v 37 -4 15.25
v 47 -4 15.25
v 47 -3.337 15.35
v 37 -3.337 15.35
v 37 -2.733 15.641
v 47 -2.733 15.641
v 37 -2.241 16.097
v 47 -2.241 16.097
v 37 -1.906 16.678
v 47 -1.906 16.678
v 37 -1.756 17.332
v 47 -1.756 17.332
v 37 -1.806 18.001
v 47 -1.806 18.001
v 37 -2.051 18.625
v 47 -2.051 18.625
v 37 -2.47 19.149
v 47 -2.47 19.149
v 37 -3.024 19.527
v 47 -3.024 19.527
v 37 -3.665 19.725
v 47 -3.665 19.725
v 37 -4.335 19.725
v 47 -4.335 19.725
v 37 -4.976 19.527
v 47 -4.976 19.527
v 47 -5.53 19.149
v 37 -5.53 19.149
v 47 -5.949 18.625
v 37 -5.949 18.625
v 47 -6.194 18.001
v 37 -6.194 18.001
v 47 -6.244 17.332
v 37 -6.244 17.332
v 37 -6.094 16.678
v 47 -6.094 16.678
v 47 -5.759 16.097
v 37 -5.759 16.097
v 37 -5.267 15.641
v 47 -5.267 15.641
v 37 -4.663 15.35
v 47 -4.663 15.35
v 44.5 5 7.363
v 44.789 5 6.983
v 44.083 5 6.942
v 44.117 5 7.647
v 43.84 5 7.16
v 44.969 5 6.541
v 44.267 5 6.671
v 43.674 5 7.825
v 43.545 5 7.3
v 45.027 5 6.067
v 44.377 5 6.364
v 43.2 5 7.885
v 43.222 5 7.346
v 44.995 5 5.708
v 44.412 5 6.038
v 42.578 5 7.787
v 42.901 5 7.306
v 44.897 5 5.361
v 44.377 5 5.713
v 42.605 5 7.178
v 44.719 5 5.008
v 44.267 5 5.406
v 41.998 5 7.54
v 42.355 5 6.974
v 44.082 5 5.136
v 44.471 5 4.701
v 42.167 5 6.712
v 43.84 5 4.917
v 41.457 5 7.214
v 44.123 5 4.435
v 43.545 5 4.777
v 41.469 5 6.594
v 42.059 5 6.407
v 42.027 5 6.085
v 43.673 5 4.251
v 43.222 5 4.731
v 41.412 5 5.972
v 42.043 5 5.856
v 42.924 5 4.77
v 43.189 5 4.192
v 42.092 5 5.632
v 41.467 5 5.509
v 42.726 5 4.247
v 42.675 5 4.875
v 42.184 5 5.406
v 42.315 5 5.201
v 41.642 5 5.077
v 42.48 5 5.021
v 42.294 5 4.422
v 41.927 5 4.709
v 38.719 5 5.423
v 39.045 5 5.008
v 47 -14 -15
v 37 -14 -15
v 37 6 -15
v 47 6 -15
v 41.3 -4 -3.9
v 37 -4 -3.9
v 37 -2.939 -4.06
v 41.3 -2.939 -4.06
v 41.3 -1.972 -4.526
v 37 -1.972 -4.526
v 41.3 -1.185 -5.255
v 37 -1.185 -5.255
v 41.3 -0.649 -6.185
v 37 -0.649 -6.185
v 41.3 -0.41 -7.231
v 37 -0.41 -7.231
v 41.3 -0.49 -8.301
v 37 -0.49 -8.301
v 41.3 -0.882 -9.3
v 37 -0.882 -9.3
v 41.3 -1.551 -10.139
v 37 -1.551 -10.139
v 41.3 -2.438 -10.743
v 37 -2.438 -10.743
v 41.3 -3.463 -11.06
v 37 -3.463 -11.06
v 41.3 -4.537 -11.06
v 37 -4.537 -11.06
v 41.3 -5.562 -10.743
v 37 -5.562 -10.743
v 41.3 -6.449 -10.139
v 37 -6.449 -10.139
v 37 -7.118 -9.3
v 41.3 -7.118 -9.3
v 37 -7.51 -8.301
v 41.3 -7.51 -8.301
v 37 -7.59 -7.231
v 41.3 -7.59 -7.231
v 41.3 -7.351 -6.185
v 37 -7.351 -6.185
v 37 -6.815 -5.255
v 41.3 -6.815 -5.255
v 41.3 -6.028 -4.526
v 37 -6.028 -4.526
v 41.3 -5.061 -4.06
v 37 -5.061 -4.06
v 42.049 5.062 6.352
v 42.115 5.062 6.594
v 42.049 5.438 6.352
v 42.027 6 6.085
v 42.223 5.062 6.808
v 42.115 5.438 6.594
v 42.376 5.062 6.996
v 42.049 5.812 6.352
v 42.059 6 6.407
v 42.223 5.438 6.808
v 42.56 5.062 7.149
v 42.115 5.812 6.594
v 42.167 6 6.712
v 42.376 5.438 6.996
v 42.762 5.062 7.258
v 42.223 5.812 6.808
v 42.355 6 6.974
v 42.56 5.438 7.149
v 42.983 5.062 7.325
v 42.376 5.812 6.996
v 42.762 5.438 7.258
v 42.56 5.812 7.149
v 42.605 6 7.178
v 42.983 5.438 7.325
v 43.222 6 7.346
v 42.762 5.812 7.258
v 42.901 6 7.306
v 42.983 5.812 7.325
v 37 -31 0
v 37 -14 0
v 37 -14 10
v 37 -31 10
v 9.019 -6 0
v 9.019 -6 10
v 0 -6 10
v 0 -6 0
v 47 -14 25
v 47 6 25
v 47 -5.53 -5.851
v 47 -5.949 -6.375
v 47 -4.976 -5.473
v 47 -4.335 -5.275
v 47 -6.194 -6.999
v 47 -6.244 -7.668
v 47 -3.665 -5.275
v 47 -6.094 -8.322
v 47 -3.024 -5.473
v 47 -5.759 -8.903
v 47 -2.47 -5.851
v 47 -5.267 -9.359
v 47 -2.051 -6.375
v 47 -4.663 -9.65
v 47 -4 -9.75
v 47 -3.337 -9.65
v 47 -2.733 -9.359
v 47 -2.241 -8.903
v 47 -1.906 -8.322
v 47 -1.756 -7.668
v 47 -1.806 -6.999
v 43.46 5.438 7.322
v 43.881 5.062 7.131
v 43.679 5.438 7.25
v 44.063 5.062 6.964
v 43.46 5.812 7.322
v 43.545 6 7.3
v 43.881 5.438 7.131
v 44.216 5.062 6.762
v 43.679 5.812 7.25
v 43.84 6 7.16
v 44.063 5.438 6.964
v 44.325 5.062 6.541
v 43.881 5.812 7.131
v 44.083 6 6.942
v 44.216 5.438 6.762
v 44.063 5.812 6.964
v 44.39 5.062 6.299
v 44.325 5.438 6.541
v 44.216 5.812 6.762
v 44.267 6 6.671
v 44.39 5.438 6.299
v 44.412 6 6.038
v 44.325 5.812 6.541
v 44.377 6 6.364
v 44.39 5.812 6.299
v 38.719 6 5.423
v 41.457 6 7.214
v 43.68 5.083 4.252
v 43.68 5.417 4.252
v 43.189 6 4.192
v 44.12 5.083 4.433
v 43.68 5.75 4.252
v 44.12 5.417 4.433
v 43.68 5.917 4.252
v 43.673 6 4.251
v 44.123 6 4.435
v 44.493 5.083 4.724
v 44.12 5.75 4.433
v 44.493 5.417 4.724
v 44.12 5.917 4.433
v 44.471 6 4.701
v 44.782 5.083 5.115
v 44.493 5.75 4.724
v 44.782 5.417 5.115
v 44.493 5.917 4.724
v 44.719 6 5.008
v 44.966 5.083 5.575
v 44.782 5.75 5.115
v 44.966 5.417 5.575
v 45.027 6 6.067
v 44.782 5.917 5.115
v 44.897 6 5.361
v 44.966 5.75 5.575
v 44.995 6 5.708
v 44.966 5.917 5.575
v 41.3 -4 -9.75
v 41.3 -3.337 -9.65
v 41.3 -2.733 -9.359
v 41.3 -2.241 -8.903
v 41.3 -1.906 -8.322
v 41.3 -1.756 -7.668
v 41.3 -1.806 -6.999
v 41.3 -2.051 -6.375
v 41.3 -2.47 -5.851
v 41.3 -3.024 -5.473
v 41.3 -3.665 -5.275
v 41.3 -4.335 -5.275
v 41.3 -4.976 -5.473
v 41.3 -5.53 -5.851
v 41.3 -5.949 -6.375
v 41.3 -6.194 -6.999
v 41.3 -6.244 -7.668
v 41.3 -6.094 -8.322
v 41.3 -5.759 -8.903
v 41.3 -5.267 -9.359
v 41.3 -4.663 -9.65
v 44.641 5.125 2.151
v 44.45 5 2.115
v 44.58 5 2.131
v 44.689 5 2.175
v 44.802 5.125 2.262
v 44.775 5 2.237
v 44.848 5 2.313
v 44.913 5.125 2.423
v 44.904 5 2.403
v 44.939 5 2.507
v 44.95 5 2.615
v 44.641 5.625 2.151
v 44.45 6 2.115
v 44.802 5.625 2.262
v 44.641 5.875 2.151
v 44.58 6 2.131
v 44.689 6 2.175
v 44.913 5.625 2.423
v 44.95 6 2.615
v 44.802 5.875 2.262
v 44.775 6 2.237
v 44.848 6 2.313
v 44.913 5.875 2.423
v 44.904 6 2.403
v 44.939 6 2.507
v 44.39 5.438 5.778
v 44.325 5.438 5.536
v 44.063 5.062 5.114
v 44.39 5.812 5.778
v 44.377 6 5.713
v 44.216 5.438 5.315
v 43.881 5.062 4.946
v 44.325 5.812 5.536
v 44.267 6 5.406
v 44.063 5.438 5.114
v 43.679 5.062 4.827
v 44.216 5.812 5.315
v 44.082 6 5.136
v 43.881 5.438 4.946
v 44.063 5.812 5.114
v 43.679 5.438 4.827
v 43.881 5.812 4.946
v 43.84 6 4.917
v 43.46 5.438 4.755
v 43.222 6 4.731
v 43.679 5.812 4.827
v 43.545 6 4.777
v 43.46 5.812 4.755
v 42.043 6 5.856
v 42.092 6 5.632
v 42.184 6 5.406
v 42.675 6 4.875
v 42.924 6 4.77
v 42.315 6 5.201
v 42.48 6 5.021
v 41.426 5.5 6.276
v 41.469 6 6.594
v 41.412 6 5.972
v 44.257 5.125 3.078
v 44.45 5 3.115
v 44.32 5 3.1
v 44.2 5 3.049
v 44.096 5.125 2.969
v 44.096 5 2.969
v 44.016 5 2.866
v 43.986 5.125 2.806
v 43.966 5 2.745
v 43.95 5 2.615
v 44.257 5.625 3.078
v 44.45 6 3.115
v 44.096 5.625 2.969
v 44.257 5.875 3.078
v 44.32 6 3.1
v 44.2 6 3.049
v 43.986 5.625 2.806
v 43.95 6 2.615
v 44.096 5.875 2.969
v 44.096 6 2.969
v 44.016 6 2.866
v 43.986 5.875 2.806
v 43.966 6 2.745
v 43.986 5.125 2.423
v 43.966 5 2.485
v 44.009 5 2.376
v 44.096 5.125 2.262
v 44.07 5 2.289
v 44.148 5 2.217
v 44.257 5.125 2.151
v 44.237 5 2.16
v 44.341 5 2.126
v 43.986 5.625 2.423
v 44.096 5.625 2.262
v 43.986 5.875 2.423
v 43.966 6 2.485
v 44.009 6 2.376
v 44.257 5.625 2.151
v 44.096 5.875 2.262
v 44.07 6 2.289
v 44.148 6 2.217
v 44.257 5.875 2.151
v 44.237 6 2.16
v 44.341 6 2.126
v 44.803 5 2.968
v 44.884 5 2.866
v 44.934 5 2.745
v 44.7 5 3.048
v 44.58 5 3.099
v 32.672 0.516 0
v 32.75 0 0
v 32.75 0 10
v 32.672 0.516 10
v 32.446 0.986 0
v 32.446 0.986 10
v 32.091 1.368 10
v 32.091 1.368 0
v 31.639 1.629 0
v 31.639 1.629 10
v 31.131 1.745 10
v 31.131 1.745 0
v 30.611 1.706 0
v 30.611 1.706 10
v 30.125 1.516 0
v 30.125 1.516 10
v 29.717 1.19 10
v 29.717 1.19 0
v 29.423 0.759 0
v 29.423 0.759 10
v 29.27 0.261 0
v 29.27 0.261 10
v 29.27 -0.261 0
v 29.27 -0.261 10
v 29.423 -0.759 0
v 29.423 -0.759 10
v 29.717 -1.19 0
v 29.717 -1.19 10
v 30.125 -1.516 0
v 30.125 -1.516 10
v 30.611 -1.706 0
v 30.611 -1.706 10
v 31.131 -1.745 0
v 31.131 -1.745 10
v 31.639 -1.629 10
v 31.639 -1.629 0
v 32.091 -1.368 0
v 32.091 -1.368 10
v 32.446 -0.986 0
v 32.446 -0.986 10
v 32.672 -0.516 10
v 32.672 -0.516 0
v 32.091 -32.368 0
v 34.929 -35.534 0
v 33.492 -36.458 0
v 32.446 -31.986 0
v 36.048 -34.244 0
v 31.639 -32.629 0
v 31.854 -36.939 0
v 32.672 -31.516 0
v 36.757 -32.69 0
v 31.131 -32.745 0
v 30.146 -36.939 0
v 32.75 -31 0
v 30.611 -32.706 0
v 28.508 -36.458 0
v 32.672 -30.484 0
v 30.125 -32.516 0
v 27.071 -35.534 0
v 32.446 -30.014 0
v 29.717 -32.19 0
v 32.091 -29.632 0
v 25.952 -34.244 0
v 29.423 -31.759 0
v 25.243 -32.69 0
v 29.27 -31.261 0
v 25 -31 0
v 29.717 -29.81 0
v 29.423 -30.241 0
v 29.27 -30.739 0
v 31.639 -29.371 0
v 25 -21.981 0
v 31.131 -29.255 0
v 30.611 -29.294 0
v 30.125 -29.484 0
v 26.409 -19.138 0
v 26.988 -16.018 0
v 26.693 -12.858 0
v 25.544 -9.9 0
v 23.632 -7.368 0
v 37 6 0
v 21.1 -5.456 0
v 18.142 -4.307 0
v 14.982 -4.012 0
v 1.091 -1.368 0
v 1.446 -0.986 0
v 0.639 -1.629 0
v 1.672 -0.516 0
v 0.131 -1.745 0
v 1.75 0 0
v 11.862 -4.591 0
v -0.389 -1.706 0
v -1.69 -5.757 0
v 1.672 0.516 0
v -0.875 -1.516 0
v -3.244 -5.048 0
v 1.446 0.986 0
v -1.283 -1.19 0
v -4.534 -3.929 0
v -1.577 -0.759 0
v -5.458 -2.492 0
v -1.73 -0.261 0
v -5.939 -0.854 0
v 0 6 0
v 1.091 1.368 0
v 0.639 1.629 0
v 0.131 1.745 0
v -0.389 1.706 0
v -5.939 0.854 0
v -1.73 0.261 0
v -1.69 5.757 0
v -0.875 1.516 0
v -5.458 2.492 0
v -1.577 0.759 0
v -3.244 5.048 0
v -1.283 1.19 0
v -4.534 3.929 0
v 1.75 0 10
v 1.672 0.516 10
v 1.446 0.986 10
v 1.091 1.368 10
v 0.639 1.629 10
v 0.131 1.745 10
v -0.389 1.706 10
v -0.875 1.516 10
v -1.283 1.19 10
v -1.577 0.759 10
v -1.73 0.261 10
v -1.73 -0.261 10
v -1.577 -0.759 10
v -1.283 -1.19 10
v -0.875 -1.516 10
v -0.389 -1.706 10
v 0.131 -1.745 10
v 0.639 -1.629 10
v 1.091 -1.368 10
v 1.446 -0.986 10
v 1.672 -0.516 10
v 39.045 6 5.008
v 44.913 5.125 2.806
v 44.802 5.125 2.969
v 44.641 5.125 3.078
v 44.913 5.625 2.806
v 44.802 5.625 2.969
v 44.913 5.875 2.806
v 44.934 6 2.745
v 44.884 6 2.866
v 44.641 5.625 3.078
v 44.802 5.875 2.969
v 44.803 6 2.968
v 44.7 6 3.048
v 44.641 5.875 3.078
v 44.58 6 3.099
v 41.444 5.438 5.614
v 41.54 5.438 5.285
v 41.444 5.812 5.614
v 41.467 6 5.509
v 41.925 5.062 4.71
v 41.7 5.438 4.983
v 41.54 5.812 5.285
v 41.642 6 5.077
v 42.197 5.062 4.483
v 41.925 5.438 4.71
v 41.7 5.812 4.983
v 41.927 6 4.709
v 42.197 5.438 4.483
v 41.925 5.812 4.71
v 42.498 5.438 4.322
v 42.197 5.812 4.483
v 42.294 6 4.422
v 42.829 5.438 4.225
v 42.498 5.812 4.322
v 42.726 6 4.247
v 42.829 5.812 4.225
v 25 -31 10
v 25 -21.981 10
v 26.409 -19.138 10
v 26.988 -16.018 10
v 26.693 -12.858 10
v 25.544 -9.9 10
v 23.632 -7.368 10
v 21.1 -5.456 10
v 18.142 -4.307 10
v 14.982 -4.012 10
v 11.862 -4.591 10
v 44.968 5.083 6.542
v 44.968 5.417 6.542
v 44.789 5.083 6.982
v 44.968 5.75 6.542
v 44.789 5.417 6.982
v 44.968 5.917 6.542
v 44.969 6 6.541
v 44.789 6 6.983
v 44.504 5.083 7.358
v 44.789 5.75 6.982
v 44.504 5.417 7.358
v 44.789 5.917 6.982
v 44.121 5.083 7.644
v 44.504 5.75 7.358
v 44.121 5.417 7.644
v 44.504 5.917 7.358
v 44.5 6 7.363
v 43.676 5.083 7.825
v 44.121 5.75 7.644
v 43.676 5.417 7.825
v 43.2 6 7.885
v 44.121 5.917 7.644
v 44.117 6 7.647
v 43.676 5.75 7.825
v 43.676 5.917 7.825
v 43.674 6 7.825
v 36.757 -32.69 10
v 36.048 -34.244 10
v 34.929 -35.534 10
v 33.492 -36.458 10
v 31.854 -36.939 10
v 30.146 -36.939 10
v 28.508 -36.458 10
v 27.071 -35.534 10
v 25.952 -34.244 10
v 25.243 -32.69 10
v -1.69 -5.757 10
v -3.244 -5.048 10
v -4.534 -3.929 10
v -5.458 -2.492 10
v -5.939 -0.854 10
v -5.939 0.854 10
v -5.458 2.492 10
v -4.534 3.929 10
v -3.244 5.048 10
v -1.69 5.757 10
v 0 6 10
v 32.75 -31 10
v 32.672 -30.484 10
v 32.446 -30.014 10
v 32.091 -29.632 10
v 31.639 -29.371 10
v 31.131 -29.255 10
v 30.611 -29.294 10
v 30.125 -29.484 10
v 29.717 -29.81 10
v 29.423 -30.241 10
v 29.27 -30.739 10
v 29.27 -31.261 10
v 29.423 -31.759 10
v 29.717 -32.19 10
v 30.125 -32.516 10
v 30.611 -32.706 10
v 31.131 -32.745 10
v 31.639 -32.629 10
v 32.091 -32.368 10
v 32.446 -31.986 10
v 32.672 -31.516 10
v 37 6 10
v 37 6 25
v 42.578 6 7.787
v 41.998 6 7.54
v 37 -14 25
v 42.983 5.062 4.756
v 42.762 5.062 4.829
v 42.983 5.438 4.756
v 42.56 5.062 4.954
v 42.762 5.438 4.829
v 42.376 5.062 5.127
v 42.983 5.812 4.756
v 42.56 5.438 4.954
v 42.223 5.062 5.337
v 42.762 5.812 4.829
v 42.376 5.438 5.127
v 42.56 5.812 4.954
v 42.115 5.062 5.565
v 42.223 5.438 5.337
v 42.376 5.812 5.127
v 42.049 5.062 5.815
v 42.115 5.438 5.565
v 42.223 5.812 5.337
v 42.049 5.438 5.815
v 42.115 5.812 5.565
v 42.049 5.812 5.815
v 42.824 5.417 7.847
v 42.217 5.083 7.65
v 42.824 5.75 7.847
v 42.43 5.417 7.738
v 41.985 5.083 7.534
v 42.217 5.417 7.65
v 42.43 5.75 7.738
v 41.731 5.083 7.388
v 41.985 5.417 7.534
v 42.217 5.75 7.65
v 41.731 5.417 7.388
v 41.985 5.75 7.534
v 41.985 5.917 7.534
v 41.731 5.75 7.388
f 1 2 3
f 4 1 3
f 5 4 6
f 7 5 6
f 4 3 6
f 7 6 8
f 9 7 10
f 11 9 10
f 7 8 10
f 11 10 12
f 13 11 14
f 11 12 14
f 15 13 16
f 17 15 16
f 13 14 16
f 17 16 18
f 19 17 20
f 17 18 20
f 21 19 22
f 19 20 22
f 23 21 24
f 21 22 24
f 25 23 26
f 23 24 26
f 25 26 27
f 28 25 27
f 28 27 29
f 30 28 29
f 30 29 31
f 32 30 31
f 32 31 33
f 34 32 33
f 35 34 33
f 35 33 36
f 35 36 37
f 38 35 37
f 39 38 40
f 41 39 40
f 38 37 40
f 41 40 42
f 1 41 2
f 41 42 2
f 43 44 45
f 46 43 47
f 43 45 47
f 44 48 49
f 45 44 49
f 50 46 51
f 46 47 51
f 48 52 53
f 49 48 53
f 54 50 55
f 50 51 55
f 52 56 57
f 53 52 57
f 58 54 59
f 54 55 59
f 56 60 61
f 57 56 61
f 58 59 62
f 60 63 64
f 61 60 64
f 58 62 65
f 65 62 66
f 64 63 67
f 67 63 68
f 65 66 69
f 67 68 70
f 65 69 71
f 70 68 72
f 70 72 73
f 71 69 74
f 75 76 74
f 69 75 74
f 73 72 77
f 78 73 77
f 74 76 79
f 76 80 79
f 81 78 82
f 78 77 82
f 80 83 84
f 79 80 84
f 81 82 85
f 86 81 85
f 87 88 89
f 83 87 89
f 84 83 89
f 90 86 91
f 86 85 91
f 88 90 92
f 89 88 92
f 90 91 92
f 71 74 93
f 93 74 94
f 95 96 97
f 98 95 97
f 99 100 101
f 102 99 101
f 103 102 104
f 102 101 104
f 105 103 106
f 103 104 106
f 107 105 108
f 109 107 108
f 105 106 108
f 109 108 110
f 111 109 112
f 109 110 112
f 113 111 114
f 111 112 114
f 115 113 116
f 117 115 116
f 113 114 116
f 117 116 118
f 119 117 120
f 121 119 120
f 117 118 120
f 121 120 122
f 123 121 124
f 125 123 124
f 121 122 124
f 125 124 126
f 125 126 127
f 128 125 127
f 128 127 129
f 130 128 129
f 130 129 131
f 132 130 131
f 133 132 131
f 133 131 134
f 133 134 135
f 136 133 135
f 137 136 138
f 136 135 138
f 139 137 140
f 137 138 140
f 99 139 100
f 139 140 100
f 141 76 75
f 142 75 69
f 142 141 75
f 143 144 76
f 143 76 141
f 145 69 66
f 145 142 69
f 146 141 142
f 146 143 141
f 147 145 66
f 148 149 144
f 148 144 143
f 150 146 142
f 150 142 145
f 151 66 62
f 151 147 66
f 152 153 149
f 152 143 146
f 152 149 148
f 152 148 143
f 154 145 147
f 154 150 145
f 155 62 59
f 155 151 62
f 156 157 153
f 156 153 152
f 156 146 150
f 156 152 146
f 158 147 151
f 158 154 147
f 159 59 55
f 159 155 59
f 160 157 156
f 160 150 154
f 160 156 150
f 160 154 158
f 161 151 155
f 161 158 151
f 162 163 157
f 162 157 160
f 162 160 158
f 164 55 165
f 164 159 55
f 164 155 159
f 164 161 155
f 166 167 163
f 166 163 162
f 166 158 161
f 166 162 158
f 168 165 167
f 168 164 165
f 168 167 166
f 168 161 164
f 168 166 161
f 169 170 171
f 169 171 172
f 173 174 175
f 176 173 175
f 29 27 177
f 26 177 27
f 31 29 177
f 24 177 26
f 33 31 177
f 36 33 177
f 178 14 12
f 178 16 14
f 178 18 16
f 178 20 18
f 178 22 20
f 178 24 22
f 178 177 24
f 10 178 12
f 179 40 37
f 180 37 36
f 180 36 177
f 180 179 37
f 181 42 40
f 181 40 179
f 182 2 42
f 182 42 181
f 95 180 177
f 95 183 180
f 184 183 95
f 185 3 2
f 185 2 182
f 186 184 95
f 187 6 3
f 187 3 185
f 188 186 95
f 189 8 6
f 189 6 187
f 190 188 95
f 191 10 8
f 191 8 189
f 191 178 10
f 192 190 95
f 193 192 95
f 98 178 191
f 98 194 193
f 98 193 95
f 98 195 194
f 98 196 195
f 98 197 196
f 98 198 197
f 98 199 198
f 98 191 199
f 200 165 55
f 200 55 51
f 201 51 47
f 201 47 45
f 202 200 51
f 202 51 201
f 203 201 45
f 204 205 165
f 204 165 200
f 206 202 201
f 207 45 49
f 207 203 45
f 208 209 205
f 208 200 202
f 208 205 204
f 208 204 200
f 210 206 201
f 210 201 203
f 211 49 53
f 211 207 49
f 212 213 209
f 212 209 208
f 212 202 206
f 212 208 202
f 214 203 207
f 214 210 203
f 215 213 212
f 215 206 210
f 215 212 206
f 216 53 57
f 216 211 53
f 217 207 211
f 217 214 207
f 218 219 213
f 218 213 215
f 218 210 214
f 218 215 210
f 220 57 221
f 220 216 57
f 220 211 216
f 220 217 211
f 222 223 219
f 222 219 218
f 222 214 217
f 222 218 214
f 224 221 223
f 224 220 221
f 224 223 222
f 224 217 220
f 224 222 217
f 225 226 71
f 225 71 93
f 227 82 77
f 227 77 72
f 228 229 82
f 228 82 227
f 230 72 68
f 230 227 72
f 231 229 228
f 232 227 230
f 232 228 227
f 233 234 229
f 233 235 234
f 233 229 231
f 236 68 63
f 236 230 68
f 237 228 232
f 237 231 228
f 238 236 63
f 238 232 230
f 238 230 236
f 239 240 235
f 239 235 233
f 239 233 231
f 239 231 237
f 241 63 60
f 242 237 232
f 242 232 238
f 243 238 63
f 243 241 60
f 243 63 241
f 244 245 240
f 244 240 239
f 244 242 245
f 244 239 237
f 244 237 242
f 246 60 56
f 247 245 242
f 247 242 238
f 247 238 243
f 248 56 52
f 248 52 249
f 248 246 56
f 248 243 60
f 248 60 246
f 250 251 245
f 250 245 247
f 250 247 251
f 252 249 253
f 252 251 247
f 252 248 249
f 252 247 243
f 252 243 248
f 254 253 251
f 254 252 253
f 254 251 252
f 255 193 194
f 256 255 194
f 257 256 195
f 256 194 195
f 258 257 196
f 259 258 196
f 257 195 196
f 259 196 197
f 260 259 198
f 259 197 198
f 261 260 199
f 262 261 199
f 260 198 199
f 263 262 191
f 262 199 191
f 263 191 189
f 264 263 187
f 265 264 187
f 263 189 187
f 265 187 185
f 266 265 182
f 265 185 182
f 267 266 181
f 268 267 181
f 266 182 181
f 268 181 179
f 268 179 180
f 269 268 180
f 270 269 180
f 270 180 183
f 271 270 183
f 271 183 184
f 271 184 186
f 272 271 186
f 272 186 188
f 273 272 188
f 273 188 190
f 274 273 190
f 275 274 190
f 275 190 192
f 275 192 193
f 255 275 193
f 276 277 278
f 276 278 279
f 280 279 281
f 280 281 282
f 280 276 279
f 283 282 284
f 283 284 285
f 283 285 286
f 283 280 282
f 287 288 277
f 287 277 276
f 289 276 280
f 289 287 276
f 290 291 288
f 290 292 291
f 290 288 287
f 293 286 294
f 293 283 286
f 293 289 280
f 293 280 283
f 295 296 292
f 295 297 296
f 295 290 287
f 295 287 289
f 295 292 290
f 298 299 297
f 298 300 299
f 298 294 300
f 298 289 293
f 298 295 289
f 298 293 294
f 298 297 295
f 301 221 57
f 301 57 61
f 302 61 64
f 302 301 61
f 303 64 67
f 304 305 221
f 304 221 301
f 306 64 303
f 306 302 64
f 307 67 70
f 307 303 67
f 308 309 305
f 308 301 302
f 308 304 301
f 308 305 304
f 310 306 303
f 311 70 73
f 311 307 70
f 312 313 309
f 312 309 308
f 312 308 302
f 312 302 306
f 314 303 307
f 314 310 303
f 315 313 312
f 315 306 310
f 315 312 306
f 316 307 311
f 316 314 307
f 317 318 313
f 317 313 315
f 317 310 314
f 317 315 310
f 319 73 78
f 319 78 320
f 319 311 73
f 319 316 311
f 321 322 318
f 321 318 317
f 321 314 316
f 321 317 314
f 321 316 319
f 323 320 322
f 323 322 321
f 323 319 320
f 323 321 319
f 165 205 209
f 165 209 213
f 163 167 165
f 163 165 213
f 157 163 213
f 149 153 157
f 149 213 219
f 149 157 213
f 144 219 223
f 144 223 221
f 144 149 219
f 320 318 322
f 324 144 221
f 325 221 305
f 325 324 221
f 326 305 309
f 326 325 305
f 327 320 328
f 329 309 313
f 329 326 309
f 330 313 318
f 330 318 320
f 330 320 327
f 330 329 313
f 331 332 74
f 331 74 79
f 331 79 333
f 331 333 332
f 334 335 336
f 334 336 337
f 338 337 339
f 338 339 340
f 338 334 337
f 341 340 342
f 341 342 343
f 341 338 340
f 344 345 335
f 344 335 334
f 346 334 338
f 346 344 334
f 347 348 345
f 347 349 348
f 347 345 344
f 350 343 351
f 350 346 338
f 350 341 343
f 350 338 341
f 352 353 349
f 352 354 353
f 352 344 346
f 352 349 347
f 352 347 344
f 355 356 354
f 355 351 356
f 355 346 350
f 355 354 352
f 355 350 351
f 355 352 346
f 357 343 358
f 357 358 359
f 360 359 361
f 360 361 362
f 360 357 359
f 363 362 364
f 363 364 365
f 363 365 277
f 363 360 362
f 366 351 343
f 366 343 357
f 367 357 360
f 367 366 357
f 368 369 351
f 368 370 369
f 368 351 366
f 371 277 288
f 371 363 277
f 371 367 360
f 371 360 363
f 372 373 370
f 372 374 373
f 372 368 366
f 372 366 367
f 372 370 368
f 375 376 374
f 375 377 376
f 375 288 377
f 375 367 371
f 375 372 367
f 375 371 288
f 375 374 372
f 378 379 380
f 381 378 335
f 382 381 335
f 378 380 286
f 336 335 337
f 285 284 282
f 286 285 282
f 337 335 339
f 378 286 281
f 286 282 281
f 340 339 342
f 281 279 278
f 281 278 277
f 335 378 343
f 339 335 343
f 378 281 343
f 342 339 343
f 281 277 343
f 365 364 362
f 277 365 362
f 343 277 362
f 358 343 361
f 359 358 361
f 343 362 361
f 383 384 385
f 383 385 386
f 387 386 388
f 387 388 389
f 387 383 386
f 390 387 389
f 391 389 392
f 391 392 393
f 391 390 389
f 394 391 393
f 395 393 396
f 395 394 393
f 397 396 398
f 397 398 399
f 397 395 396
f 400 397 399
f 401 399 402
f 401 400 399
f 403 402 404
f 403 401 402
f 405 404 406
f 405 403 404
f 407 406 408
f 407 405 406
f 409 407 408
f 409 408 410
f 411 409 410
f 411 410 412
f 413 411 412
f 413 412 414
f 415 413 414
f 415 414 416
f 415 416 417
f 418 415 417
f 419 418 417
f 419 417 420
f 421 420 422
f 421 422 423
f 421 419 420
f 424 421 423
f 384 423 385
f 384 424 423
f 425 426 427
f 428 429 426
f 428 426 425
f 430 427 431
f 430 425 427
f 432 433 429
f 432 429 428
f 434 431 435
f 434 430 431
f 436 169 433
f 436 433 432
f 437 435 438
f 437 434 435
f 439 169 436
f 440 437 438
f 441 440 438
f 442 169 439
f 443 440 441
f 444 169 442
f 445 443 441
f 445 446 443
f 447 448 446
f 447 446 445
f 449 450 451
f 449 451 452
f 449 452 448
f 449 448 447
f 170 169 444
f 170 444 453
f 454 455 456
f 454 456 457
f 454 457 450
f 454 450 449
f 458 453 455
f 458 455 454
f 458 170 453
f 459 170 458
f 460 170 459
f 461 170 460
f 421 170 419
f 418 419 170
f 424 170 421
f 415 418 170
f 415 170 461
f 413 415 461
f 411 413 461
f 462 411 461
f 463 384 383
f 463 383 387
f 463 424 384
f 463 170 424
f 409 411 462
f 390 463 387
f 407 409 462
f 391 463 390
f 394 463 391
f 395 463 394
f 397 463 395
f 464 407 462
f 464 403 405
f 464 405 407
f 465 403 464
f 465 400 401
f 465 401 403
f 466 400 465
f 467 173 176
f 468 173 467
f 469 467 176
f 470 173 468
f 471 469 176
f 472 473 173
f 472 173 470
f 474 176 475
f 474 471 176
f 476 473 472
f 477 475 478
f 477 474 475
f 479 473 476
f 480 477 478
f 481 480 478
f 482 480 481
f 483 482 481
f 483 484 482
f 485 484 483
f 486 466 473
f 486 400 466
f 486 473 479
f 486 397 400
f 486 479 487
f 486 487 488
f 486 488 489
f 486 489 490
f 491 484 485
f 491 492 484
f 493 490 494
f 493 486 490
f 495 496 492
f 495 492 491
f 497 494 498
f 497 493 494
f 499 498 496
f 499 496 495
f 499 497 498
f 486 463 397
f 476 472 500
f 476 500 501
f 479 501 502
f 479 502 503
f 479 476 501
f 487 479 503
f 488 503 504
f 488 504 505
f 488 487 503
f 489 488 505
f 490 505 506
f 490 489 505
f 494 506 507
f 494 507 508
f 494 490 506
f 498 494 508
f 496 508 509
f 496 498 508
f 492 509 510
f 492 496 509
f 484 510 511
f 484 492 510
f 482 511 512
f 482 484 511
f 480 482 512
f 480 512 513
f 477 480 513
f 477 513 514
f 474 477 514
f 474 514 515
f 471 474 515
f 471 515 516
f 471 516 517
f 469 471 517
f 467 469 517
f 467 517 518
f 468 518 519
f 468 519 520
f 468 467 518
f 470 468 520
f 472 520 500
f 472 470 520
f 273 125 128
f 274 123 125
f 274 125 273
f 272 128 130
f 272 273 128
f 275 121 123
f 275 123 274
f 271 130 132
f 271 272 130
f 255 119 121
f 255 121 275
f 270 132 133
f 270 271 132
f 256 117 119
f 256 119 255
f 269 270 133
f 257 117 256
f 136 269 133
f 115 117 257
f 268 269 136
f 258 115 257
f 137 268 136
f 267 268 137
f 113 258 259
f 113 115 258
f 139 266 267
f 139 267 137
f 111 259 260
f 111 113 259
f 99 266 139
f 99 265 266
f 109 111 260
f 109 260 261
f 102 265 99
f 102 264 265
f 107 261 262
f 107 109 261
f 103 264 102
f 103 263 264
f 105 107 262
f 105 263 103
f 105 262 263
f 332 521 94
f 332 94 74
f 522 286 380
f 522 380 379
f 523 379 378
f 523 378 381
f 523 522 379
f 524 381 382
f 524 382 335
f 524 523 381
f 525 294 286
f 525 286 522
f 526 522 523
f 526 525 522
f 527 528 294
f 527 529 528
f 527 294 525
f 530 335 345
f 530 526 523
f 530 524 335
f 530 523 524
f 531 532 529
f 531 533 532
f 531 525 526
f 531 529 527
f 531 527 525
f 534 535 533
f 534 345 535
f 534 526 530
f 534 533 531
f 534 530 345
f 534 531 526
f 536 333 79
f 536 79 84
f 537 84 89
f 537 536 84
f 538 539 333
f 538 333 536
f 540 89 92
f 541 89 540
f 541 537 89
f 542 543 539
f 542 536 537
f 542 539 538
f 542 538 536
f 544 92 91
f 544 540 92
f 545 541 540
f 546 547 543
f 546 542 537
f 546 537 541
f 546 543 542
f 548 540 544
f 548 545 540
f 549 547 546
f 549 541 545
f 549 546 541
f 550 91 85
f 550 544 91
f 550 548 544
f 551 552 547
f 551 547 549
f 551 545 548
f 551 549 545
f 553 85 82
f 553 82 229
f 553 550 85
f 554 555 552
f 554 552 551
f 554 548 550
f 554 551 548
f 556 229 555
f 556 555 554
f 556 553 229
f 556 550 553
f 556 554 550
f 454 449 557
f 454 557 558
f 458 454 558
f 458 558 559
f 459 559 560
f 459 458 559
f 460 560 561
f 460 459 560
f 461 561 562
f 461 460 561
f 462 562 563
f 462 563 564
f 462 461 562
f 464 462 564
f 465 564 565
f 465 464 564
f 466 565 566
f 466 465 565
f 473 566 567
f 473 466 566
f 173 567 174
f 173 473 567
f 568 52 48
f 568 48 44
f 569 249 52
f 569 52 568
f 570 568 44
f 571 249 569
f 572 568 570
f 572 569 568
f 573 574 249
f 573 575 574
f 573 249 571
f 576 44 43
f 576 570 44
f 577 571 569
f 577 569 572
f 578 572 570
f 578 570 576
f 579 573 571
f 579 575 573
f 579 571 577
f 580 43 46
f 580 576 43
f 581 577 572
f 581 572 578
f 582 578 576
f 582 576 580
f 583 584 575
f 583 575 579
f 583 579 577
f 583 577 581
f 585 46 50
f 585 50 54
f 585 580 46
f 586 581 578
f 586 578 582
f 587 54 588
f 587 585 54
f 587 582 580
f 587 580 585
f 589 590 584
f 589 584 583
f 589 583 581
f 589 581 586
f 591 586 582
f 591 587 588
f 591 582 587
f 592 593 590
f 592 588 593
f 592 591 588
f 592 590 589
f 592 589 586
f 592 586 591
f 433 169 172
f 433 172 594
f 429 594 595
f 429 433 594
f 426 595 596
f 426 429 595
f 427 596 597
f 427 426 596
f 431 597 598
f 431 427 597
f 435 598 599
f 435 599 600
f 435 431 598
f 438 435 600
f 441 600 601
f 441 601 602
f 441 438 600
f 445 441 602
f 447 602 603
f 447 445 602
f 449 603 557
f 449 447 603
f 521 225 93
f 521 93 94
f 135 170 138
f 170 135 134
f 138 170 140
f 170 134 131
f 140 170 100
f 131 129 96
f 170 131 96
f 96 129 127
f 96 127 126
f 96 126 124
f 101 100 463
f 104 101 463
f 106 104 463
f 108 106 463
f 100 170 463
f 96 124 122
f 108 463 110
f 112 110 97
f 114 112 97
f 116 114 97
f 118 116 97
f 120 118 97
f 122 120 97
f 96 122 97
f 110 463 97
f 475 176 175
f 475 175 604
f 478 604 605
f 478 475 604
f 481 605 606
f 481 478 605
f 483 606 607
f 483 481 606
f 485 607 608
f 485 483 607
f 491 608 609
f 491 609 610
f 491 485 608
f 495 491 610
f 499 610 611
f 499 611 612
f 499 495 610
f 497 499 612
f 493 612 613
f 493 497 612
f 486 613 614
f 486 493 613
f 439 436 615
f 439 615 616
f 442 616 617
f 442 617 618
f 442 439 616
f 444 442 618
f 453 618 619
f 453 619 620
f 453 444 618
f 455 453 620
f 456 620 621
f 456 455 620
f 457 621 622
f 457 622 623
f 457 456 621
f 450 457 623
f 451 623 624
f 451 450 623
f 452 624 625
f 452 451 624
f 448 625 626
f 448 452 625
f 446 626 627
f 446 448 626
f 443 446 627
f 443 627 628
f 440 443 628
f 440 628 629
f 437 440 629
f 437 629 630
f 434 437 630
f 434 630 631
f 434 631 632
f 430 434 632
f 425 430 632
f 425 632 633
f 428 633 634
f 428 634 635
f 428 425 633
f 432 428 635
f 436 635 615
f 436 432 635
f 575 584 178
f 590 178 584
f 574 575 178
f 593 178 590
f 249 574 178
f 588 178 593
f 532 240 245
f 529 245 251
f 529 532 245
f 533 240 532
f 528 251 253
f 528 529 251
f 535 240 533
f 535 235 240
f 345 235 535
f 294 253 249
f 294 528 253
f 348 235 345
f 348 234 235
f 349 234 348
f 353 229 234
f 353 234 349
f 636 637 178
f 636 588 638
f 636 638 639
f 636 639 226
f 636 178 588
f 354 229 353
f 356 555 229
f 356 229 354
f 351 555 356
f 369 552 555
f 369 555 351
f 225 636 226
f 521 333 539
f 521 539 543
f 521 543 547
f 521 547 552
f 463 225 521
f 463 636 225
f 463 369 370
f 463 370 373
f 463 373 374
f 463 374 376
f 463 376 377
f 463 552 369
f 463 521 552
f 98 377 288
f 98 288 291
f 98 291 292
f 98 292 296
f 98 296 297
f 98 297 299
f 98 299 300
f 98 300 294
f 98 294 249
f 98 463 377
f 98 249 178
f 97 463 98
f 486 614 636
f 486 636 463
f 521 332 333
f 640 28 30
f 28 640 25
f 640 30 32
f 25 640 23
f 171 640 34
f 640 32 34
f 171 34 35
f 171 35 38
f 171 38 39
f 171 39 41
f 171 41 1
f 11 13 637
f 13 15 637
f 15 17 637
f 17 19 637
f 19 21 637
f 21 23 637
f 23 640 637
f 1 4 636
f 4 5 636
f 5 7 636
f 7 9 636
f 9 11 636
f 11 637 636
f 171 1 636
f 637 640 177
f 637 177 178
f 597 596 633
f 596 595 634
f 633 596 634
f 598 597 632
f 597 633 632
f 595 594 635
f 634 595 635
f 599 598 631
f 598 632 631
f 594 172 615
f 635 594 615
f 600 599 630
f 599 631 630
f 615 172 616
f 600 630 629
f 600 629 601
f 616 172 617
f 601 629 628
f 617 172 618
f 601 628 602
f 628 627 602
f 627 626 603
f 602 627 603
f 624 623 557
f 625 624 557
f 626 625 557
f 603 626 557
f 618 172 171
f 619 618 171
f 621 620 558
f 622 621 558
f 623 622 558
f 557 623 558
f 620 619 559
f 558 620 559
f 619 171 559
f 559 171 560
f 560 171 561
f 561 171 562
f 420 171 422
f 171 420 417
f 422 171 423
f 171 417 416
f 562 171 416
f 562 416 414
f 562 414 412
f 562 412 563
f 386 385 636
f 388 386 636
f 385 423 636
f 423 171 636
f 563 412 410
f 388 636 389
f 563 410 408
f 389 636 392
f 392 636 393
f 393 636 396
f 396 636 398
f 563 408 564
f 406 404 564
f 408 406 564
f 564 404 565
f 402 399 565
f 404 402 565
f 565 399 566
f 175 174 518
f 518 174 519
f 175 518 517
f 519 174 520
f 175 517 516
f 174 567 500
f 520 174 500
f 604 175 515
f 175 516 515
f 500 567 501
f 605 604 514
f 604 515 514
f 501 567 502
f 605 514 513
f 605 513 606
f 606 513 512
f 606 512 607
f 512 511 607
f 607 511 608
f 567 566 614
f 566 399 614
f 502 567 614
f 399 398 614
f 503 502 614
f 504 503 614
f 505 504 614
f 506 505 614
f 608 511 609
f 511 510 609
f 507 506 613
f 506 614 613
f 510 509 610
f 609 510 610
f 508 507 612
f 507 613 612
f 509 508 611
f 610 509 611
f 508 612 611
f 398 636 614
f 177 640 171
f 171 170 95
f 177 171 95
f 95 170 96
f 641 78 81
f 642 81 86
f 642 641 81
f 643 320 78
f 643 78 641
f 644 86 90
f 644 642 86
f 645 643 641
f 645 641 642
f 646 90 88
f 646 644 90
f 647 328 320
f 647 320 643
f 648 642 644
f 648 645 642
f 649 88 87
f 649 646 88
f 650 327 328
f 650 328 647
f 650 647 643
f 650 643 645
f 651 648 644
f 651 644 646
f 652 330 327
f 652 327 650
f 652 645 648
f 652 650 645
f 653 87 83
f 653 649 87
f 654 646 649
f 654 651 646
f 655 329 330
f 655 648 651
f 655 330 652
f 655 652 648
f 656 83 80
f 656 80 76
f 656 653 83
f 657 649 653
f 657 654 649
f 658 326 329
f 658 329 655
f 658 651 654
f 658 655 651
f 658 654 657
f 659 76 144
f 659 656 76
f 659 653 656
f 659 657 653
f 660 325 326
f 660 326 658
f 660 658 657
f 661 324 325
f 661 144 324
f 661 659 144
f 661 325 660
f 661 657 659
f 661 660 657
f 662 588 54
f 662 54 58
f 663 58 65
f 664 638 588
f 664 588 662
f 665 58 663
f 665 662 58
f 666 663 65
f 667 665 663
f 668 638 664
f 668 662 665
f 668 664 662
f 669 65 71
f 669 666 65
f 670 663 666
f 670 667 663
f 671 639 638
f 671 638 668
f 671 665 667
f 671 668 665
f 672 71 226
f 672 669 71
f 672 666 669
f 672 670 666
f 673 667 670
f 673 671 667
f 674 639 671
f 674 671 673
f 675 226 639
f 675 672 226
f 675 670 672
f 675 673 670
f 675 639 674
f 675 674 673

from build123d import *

# Parameters (mm, degrees)
CROQUIS1_R              = 1.75
SALIENTE_EXTRUIR1_DEPTH = 10
CROQUIS3_W              = 40
CROQUIS3_H              = 20
SALIENTE_EXTRUIR2_DEPTH = 10
CROQUIS4_R              = 2.25
CORTAR_EXTRUIR2_DEPTH   = 10
CORTAR_EXTRUIR3_DEPTH   = 1
CROQUIS6_R              = 3.6
CORTAR_EXTRUIR4_DEPTH   = 4.3


with BuildPart() as part:
    # Croquis1 → Saliente-Extruir1 (new body)
    with BuildSketch(Plane.XY):
        with BuildLine():
            Line((0, 6), (31, 6))
            Line((31, 6), (37, 6))
            Line((37, 6), (37, 0))
            Line((37, 0), (37, -31))
            ThreePointArc((37, -31), (31, -37), (25, -31))
            Line((25, -31), (25, -21.980740698))
            ThreePointArc((25, -21.980740698), (23.631727984, -7.368272016), (9.019259302, -6))
            Line((9.019259302, -6), (0, -6))
            ThreePointArc((0, -6), (-6, 0), (0, 6))
        make_face()
        Circle(CROQUIS1_R, mode=Mode.SUBTRACT)
        with Locations((31, 0)):
            Circle(CROQUIS1_R, mode=Mode.SUBTRACT)
        with Locations((31, -31)):
            Circle(CROQUIS1_R, mode=Mode.SUBTRACT)
    extrude(amount=SALIENTE_EXTRUIR1_DEPTH)

    # Croquis3 → Saliente-Extruir2 (add)
    with BuildSketch(Plane(origin=(37, 0, 0), x_dir=(0, 0, -1), z_dir=(1, 0, 0))):
        with Locations((-5, -4)):
            Rectangle(CROQUIS3_W, CROQUIS3_H)
    extrude(amount=SALIENTE_EXTRUIR2_DEPTH)

    # Croquis4 → Cortar-Extruir2 (cut)
    with BuildSketch(Plane(origin=(47, 0, 0), x_dir=(0, 0, -1), z_dir=(1, 0, 0))):
        with Locations((-17.5, -4)):
            Circle(CROQUIS4_R)
        with Locations((7.5, -4)):
            Circle(CROQUIS4_R)
    extrude(amount=-CORTAR_EXTRUIR2_DEPTH, mode=Mode.SUBTRACT)

    # Croquis5 → Cortar-Extruir3 (cut)
    # profile 1 of 2: a face of its own
    with BuildSketch(Plane(origin=(0, 6, 0), x_dir=(1, 0, 0), z_dir=(0, 1, 0))):
        with BuildLine():
            Line((38.719450651, -5.423076923), (39.045171805, -5.008413462))
            Line((39.045171805, -5.008413462), (41.469450651, -6.59375))
            add(Edge.make_bspline(
                [(41.469450651, -6.59375), (41.45262689, -6.488200954), (41.419810241, -6.282315605), (41.414396621, -6.073916922), (41.411758343, -5.972355769)],
                knots=[0, 0, 0, 0, 1.025318673, 2, 2, 2, 2], degree=3))
            add(Edge.make_bspline(
                [(41.411758343, -5.972355769), (41.413397392, -5.911374347), (41.41662381, -5.791334232), (41.441453269, -5.615094001), (41.48058203, -5.445741533), (41.537620193, -5.283978793), (41.610481332, -5.12922502), (41.69780526, -4.98059268), (41.804100137, -4.84087365), (41.922842279, -4.708276629), (42.054348853, -4.587868709), (42.193923862, -4.481348491), (42.341556266, -4.391383269), (42.497212867, -4.319707477), (42.659675206, -4.262425826), (42.829576898, -4.221648263), (43.0072047, -4.197270821), (43.128028028, -4.193979555), (43.189402574, -4.192307692)],
                knots=[0, 0, 0, 0, 1.043709831, 2.054511743, 3.041122595, 4.01515914, 4.98481438, 5.965901842, 6.960491961, 7.985277438, 9.0096037, 10.00832444, 10.987059228, 11.962929573, 12.936966118, 13.931840027, 14.949438142, 16, 16, 16, 16], degree=3))
            add(Edge.make_bspline(
                [(43.189402574, -4.192307692), (43.273370923, -4.194741372), (43.438600762, -4.199530277), (43.679201656, -4.247450052), (43.908280527, -4.321356873), (44.121873475, -4.428685672), (44.321459866, -4.559473328), (44.497723912, -4.720926587), (44.654923346, -4.905035031), (44.786320549, -5.113320498), (44.893643904, -5.337445219), (44.970726157, -5.572907398), (45.018183801, -5.817410653), (45.024133369, -5.983361467), (45.027142959, -6.067307692)],
                knots=[0, 0, 0, 0, 1.031403119, 2.029557249, 3.004870281, 3.983165322, 4.960181699, 5.929903783, 6.912123683, 7.928973898, 8.949315281, 9.960468141, 10.968302741, 12, 12, 12, 12], degree=3))
            add(Edge.make_bspline(
                [(45.027142959, -6.067307692), (45.024530622, -6.148048292), (45.019356041, -6.307981282), (44.973019832, -6.5431878), (44.898450918, -6.769592811), (44.79356478, -6.984290092), (44.66331814, -7.183504791), (44.507611369, -7.363156395), (44.32622815, -7.5184301), (44.123136349, -7.648813278), (43.905204402, -7.75266345), (43.677571617, -7.829814545), (43.441193643, -7.875117968), (43.280937295, -7.881434097), (43.200219882, -7.884615385)],
                knots=[0, 0, 0, 0, 1.012172929, 2.004937354, 2.995255351, 3.995689452, 4.993936421, 5.973737378, 6.968231049, 7.979117505, 8.993136101, 9.989812463, 10.987515067, 12, 12, 12, 12], degree=3))
            add(Edge.make_bspline(
                [(43.200219882, -7.884615385), (43.138429168, -7.88259005), (43.012264336, -7.878454705), (42.821183145, -7.849580321), (42.625667005, -7.80318353), (42.459802673, -7.751223108), (42.323925778, -7.696322062), (42.214376937, -7.650631994), (42.101643669, -7.593762287), (41.981860293, -7.533122205), (41.858113837, -7.463253287), (41.728336117, -7.387283602), (41.594591099, -7.303112772), (41.503829621, -7.244106778), (41.45743142, -7.213942308)],
                knots=[0, 0, 0, 0, 1.173818275, 2.396712641, 3.66331629, 4.989737886, 5.693666774, 6.447286557, 7.243889047, 8.091586357, 8.998013824, 9.943181721, 10.948533338, 12, 12, 12, 12], degree=3))
            Line((41.45743142, -7.213942308), (38.719450651, -5.423076923))
        make_face()
        with BuildLine():
            add(Edge.make_bspline(
                [(42.027142959, -6.085336538), (42.028463871, -6.131047697), (42.031043996, -6.220334868), (42.046353115, -6.351256722), (42.074217455, -6.47556773), (42.112853793, -6.593303975), (42.160487874, -6.705191769), (42.221606583, -6.809013804), (42.29279593, -6.906906504), (42.373927128, -6.997305799), (42.462694986, -7.079287189), (42.557788622, -7.149882157), (42.656897901, -7.210778026), (42.760855723, -7.260289629), (42.869621095, -7.298844068), (42.982694109, -7.326732492), (43.100832915, -7.34225321), (43.180945778, -7.344835321), (43.221854497, -7.346153846)],
                knots=[0, 0, 0, 0, 1.129656352, 2.206547016, 3.251334079, 4.271920891, 5.265058649, 6.249872215, 7.241923875, 8.251504132, 9.246416584, 10.222533834, 11.173322129, 12.116503788, 13.062124155, 14.020151864, 14.989013135, 16, 16, 16, 16], degree=3))
            add(Edge.make_bspline(
                [(43.221854497, -7.346153846), (43.262390236, -7.345042059), (43.342270883, -7.342851147), (43.459527516, -7.324197734), (43.572108371, -7.294382199), (43.679590351, -7.251311648), (43.784036826, -7.19897235), (43.882187361, -7.131790832), (43.97722126, -7.054685968), (44.064722932, -6.964658995), (44.145955918, -6.8673042), (44.217253031, -6.763510182), (44.277542135, -6.654839733), (44.327498317, -6.541605832), (44.364273193, -6.422408765), (44.39242636, -6.29918399), (44.407818081, -6.170256123), (44.410427684, -6.082969666), (44.411758343, -6.038461538)],
                knots=[0, 0, 0, 0, 0.989367052, 1.949669134, 2.891858276, 3.827522767, 4.772653562, 5.738670152, 6.725809442, 7.756636004, 8.798867547, 9.819240912, 10.826537776, 11.829883227, 12.835515726, 13.868058748, 14.912904531, 16, 16, 16, 16], degree=3))
            add(Edge.make_bspline(
                [(44.411758343, -6.038461538), (44.41042758, -5.993953484), (44.407817774, -5.90666717), (44.392427526, -5.777738265), (44.364268919, -5.654517323), (44.327513802, -5.535306334), (44.277484342, -5.422124068), (44.217630322, -5.313548608), (44.145518764, -5.210736256), (44.064862408, -5.113318104), (43.976721258, -5.02366527), (43.883043664, -4.944746981), (43.783251472, -4.879664359), (43.680001032, -4.825249844), (43.572044173, -4.782656193), (43.459545037, -4.752693871), (43.342266312, -4.73408014), (43.262388698, -4.731883781), (43.221854497, -4.730769231)],
                knots=[0, 0, 0, 0, 1.087281468, 2.132306021, 3.165025708, 4.170830268, 5.174347389, 6.181816599, 7.194310624, 8.23672049, 9.267723423, 10.261267456, 11.222032883, 12.171822355, 13.107646935, 14.049997283, 15.01046367, 16, 16, 16, 16], degree=3))
            add(Edge.make_bspline(
                [(43.221854497, -4.730769231), (43.180892409, -4.73171259), (43.100497153, -4.733564098), (42.982746954, -4.754505725), (42.869046586, -4.783549789), (42.760110728, -4.827406434), (42.656368933, -4.884383287), (42.557298409, -4.953783726), (42.462134709, -5.034066908), (42.373753422, -5.126810316), (42.292883888, -5.227746884), (42.22170449, -5.335154265), (42.160945465, -5.447073949), (42.113001784, -5.565082488), (42.074377809, -5.687592088), (42.046452462, -5.815448694), (42.031083903, -5.948743241), (42.028473339, -6.039225506), (42.027142959, -6.085336538)],
                knots=[0, 0, 0, 0, 0.978259475, 1.920005202, 2.851759169, 3.7803069, 4.719124913, 5.675758531, 6.668034766, 7.691045932, 8.733780038, 9.756656648, 10.768121246, 11.773215211, 12.79725739, 13.836288844, 14.897342417, 16, 16, 16, 16], degree=3))
        make_face(mode=Mode.SUBTRACT)
    # profile 2 of 2: a face of its own
    with BuildSketch(Plane(origin=(0, 6, 0), x_dir=(1, 0, 0), z_dir=(0, 1, 0))):
        with BuildLine():
            add(Edge.make_bspline(
                [(43.950219882, -2.615384615), (43.95220531, -2.581972823), (43.956097511, -2.51647291), (43.98280038, -2.421777262), (44.030215227, -2.336072131), (44.093408561, -2.25973114), (44.170029698, -2.196805752), (44.255051256, -2.147701148), (44.3505397, -2.121230888), (44.416419143, -2.117367039), (44.450219882, -2.115384615)],
                knots=[0, 0, 0, 0, 1.020151414, 1.999887582, 2.974338812, 3.990962822, 5.007586832, 5.987933904, 6.967670073, 8, 8, 8, 8], degree=3))
            add(Edge.make_bspline(
                [(44.450219882, -2.115384615), (44.48321411, -2.117427904), (44.548278244, -2.121457239), (44.642964488, -2.147713091), (44.728083557, -2.196746141), (44.804525099, -2.260131503), (44.869244769, -2.335615588), (44.916031001, -2.422045399), (44.944737682, -2.516233448), (44.948370129, -2.581929945), (44.950219882, -2.615384615)],
                knots=[0, 0, 0, 0, 1.009624703, 1.990965087, 2.972917375, 3.991206001, 5.017354006, 5.993400798, 6.978178195, 8, 8, 8, 8], degree=3))
            add(Edge.make_bspline(
                [(44.950219882, -2.615384615), (44.948437276, -2.648863379), (44.944957162, -2.714222696), (44.915444253, -2.80805959), (44.869691223, -2.895016193), (44.804407281, -2.970480663), (44.728478959, -3.034379676), (44.642378281, -3.081237346), (44.548549602, -3.109769691), (44.483267561, -3.113497493), (44.450219882, -3.115384615)],
                knots=[0, 0, 0, 0, 1.022258411, 1.995716197, 2.98297171, 4.009558169, 5.028281891, 6.00474573, 6.989943903, 8, 8, 8, 8], degree=3))
            add(Edge.make_bspline(
                [(44.450219882, -3.115384615), (44.416363802, -3.113563874), (44.350263962, -3.110009099), (44.255636921, -3.081250825), (44.169633882, -3.034320176), (44.093525459, -2.970882356), (44.029775797, -2.894554991), (43.983379009, -2.808332925), (43.95588116, -2.713979428), (43.952139702, -2.648819533), (43.950219882, -2.615384615)],
                knots=[0, 0, 0, 0, 1.032775665, 2.016367738, 2.991239715, 4.008302682, 5.025365648, 6.011011707, 6.979408107, 8, 8, 8, 8], degree=3))
        make_face()
    extrude(amount=-CORTAR_EXTRUIR3_DEPTH, mode=Mode.SUBTRACT)

    # Croquis6 → Cortar-Extruir4 (cut)
    with BuildSketch(Plane.ZY.offset(-37)):
        with Locations((-7.5, -4)):
            Circle(CROQUIS6_R)
    extrude(amount=-CORTAR_EXTRUIR4_DEPTH, mode=Mode.SUBTRACT)


solid = part.part
